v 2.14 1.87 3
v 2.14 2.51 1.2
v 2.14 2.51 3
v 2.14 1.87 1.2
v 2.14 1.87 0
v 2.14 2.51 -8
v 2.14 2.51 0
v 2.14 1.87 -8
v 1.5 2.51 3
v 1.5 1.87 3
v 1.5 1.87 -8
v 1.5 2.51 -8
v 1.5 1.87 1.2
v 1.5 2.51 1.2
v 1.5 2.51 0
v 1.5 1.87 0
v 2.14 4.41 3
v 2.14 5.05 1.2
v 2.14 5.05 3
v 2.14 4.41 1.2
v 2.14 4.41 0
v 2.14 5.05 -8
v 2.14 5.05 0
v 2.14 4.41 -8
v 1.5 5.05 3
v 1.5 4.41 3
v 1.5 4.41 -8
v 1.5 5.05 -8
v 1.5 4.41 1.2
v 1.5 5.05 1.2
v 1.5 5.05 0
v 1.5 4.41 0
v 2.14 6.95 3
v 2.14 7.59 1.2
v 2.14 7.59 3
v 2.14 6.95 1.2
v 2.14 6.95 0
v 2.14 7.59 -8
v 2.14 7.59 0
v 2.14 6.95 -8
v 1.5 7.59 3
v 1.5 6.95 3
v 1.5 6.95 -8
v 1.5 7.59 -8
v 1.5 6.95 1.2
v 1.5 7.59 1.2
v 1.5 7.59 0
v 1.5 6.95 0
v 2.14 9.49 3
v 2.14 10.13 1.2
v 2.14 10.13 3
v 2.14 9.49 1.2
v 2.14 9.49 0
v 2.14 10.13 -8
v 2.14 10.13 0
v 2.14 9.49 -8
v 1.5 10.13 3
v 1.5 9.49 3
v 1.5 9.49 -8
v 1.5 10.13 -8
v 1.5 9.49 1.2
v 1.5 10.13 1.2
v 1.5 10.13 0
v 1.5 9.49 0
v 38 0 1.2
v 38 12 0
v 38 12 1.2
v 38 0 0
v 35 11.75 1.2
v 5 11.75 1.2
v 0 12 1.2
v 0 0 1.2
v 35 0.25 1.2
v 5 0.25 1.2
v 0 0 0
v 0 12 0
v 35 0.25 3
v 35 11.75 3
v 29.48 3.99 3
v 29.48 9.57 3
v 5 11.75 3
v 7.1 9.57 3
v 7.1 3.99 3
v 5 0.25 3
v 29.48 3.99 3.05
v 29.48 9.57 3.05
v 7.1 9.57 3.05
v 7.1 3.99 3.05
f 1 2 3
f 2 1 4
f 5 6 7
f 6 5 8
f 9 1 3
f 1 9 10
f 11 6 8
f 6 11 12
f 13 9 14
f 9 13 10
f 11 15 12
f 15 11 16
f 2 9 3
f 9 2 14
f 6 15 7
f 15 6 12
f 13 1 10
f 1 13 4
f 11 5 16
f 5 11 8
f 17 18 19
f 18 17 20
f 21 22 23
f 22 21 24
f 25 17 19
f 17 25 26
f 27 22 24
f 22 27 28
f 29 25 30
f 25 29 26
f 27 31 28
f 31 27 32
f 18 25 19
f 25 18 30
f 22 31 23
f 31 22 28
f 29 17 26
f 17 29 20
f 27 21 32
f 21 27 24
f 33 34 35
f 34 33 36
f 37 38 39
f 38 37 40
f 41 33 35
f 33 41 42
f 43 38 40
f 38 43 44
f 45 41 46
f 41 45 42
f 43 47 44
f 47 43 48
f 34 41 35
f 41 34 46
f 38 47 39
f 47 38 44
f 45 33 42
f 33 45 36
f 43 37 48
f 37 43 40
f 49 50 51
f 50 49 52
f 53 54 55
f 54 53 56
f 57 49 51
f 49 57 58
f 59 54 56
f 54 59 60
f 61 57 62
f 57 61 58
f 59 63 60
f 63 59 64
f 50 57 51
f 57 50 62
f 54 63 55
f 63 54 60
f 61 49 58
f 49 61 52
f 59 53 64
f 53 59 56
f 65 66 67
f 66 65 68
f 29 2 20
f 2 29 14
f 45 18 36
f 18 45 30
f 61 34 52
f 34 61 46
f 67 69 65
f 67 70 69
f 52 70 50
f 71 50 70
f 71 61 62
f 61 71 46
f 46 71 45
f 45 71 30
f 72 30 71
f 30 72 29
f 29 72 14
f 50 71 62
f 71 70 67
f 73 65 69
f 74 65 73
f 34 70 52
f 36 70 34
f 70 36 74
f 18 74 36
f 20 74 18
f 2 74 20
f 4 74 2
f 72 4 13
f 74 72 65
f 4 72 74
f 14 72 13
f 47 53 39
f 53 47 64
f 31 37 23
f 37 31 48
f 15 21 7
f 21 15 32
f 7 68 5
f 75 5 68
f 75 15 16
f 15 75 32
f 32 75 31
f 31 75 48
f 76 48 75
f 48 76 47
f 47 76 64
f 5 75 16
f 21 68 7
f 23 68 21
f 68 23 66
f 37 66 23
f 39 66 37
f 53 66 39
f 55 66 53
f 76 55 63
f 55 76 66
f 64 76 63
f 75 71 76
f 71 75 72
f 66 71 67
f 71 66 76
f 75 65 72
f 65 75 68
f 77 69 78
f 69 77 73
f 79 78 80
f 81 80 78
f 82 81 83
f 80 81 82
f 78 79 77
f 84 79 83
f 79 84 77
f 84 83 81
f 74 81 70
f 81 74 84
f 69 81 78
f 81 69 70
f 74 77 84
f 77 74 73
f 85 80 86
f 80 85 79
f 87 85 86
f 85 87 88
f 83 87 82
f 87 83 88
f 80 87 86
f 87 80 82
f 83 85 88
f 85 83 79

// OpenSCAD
$fn=360;
eps=0.01;

// base board
color("skyblue") cube([38.00, 12.00, 1.20]);
// display
color("darkgrey") translate([5.00, 0.25, 1.20]) cube([30.00, 11.50, 1.80]);
// active area
color("cyan") translate([7.10, 3.99, 3.00]) cube([22.38, 5.58, 0.05]);
//pix=0.174;
//color("cyan") translate([7.10, 3.99, 3.00+eps]) for (x=[0:127]) {
//    for (y=[0:31]) {
//        translate([x*pix*1.005, y*pix, 0]) cube([pix-0.03, pix-0.03, eps]);
//    }
//}  
// pins
color("silver") translate([1.50, 2.19-0.32, -8.00]) {
    for (y=[0:3]) {
        translate([0, y*2.54, 0]) cube([0.64, 0.64, 11.00]);
    }
}
